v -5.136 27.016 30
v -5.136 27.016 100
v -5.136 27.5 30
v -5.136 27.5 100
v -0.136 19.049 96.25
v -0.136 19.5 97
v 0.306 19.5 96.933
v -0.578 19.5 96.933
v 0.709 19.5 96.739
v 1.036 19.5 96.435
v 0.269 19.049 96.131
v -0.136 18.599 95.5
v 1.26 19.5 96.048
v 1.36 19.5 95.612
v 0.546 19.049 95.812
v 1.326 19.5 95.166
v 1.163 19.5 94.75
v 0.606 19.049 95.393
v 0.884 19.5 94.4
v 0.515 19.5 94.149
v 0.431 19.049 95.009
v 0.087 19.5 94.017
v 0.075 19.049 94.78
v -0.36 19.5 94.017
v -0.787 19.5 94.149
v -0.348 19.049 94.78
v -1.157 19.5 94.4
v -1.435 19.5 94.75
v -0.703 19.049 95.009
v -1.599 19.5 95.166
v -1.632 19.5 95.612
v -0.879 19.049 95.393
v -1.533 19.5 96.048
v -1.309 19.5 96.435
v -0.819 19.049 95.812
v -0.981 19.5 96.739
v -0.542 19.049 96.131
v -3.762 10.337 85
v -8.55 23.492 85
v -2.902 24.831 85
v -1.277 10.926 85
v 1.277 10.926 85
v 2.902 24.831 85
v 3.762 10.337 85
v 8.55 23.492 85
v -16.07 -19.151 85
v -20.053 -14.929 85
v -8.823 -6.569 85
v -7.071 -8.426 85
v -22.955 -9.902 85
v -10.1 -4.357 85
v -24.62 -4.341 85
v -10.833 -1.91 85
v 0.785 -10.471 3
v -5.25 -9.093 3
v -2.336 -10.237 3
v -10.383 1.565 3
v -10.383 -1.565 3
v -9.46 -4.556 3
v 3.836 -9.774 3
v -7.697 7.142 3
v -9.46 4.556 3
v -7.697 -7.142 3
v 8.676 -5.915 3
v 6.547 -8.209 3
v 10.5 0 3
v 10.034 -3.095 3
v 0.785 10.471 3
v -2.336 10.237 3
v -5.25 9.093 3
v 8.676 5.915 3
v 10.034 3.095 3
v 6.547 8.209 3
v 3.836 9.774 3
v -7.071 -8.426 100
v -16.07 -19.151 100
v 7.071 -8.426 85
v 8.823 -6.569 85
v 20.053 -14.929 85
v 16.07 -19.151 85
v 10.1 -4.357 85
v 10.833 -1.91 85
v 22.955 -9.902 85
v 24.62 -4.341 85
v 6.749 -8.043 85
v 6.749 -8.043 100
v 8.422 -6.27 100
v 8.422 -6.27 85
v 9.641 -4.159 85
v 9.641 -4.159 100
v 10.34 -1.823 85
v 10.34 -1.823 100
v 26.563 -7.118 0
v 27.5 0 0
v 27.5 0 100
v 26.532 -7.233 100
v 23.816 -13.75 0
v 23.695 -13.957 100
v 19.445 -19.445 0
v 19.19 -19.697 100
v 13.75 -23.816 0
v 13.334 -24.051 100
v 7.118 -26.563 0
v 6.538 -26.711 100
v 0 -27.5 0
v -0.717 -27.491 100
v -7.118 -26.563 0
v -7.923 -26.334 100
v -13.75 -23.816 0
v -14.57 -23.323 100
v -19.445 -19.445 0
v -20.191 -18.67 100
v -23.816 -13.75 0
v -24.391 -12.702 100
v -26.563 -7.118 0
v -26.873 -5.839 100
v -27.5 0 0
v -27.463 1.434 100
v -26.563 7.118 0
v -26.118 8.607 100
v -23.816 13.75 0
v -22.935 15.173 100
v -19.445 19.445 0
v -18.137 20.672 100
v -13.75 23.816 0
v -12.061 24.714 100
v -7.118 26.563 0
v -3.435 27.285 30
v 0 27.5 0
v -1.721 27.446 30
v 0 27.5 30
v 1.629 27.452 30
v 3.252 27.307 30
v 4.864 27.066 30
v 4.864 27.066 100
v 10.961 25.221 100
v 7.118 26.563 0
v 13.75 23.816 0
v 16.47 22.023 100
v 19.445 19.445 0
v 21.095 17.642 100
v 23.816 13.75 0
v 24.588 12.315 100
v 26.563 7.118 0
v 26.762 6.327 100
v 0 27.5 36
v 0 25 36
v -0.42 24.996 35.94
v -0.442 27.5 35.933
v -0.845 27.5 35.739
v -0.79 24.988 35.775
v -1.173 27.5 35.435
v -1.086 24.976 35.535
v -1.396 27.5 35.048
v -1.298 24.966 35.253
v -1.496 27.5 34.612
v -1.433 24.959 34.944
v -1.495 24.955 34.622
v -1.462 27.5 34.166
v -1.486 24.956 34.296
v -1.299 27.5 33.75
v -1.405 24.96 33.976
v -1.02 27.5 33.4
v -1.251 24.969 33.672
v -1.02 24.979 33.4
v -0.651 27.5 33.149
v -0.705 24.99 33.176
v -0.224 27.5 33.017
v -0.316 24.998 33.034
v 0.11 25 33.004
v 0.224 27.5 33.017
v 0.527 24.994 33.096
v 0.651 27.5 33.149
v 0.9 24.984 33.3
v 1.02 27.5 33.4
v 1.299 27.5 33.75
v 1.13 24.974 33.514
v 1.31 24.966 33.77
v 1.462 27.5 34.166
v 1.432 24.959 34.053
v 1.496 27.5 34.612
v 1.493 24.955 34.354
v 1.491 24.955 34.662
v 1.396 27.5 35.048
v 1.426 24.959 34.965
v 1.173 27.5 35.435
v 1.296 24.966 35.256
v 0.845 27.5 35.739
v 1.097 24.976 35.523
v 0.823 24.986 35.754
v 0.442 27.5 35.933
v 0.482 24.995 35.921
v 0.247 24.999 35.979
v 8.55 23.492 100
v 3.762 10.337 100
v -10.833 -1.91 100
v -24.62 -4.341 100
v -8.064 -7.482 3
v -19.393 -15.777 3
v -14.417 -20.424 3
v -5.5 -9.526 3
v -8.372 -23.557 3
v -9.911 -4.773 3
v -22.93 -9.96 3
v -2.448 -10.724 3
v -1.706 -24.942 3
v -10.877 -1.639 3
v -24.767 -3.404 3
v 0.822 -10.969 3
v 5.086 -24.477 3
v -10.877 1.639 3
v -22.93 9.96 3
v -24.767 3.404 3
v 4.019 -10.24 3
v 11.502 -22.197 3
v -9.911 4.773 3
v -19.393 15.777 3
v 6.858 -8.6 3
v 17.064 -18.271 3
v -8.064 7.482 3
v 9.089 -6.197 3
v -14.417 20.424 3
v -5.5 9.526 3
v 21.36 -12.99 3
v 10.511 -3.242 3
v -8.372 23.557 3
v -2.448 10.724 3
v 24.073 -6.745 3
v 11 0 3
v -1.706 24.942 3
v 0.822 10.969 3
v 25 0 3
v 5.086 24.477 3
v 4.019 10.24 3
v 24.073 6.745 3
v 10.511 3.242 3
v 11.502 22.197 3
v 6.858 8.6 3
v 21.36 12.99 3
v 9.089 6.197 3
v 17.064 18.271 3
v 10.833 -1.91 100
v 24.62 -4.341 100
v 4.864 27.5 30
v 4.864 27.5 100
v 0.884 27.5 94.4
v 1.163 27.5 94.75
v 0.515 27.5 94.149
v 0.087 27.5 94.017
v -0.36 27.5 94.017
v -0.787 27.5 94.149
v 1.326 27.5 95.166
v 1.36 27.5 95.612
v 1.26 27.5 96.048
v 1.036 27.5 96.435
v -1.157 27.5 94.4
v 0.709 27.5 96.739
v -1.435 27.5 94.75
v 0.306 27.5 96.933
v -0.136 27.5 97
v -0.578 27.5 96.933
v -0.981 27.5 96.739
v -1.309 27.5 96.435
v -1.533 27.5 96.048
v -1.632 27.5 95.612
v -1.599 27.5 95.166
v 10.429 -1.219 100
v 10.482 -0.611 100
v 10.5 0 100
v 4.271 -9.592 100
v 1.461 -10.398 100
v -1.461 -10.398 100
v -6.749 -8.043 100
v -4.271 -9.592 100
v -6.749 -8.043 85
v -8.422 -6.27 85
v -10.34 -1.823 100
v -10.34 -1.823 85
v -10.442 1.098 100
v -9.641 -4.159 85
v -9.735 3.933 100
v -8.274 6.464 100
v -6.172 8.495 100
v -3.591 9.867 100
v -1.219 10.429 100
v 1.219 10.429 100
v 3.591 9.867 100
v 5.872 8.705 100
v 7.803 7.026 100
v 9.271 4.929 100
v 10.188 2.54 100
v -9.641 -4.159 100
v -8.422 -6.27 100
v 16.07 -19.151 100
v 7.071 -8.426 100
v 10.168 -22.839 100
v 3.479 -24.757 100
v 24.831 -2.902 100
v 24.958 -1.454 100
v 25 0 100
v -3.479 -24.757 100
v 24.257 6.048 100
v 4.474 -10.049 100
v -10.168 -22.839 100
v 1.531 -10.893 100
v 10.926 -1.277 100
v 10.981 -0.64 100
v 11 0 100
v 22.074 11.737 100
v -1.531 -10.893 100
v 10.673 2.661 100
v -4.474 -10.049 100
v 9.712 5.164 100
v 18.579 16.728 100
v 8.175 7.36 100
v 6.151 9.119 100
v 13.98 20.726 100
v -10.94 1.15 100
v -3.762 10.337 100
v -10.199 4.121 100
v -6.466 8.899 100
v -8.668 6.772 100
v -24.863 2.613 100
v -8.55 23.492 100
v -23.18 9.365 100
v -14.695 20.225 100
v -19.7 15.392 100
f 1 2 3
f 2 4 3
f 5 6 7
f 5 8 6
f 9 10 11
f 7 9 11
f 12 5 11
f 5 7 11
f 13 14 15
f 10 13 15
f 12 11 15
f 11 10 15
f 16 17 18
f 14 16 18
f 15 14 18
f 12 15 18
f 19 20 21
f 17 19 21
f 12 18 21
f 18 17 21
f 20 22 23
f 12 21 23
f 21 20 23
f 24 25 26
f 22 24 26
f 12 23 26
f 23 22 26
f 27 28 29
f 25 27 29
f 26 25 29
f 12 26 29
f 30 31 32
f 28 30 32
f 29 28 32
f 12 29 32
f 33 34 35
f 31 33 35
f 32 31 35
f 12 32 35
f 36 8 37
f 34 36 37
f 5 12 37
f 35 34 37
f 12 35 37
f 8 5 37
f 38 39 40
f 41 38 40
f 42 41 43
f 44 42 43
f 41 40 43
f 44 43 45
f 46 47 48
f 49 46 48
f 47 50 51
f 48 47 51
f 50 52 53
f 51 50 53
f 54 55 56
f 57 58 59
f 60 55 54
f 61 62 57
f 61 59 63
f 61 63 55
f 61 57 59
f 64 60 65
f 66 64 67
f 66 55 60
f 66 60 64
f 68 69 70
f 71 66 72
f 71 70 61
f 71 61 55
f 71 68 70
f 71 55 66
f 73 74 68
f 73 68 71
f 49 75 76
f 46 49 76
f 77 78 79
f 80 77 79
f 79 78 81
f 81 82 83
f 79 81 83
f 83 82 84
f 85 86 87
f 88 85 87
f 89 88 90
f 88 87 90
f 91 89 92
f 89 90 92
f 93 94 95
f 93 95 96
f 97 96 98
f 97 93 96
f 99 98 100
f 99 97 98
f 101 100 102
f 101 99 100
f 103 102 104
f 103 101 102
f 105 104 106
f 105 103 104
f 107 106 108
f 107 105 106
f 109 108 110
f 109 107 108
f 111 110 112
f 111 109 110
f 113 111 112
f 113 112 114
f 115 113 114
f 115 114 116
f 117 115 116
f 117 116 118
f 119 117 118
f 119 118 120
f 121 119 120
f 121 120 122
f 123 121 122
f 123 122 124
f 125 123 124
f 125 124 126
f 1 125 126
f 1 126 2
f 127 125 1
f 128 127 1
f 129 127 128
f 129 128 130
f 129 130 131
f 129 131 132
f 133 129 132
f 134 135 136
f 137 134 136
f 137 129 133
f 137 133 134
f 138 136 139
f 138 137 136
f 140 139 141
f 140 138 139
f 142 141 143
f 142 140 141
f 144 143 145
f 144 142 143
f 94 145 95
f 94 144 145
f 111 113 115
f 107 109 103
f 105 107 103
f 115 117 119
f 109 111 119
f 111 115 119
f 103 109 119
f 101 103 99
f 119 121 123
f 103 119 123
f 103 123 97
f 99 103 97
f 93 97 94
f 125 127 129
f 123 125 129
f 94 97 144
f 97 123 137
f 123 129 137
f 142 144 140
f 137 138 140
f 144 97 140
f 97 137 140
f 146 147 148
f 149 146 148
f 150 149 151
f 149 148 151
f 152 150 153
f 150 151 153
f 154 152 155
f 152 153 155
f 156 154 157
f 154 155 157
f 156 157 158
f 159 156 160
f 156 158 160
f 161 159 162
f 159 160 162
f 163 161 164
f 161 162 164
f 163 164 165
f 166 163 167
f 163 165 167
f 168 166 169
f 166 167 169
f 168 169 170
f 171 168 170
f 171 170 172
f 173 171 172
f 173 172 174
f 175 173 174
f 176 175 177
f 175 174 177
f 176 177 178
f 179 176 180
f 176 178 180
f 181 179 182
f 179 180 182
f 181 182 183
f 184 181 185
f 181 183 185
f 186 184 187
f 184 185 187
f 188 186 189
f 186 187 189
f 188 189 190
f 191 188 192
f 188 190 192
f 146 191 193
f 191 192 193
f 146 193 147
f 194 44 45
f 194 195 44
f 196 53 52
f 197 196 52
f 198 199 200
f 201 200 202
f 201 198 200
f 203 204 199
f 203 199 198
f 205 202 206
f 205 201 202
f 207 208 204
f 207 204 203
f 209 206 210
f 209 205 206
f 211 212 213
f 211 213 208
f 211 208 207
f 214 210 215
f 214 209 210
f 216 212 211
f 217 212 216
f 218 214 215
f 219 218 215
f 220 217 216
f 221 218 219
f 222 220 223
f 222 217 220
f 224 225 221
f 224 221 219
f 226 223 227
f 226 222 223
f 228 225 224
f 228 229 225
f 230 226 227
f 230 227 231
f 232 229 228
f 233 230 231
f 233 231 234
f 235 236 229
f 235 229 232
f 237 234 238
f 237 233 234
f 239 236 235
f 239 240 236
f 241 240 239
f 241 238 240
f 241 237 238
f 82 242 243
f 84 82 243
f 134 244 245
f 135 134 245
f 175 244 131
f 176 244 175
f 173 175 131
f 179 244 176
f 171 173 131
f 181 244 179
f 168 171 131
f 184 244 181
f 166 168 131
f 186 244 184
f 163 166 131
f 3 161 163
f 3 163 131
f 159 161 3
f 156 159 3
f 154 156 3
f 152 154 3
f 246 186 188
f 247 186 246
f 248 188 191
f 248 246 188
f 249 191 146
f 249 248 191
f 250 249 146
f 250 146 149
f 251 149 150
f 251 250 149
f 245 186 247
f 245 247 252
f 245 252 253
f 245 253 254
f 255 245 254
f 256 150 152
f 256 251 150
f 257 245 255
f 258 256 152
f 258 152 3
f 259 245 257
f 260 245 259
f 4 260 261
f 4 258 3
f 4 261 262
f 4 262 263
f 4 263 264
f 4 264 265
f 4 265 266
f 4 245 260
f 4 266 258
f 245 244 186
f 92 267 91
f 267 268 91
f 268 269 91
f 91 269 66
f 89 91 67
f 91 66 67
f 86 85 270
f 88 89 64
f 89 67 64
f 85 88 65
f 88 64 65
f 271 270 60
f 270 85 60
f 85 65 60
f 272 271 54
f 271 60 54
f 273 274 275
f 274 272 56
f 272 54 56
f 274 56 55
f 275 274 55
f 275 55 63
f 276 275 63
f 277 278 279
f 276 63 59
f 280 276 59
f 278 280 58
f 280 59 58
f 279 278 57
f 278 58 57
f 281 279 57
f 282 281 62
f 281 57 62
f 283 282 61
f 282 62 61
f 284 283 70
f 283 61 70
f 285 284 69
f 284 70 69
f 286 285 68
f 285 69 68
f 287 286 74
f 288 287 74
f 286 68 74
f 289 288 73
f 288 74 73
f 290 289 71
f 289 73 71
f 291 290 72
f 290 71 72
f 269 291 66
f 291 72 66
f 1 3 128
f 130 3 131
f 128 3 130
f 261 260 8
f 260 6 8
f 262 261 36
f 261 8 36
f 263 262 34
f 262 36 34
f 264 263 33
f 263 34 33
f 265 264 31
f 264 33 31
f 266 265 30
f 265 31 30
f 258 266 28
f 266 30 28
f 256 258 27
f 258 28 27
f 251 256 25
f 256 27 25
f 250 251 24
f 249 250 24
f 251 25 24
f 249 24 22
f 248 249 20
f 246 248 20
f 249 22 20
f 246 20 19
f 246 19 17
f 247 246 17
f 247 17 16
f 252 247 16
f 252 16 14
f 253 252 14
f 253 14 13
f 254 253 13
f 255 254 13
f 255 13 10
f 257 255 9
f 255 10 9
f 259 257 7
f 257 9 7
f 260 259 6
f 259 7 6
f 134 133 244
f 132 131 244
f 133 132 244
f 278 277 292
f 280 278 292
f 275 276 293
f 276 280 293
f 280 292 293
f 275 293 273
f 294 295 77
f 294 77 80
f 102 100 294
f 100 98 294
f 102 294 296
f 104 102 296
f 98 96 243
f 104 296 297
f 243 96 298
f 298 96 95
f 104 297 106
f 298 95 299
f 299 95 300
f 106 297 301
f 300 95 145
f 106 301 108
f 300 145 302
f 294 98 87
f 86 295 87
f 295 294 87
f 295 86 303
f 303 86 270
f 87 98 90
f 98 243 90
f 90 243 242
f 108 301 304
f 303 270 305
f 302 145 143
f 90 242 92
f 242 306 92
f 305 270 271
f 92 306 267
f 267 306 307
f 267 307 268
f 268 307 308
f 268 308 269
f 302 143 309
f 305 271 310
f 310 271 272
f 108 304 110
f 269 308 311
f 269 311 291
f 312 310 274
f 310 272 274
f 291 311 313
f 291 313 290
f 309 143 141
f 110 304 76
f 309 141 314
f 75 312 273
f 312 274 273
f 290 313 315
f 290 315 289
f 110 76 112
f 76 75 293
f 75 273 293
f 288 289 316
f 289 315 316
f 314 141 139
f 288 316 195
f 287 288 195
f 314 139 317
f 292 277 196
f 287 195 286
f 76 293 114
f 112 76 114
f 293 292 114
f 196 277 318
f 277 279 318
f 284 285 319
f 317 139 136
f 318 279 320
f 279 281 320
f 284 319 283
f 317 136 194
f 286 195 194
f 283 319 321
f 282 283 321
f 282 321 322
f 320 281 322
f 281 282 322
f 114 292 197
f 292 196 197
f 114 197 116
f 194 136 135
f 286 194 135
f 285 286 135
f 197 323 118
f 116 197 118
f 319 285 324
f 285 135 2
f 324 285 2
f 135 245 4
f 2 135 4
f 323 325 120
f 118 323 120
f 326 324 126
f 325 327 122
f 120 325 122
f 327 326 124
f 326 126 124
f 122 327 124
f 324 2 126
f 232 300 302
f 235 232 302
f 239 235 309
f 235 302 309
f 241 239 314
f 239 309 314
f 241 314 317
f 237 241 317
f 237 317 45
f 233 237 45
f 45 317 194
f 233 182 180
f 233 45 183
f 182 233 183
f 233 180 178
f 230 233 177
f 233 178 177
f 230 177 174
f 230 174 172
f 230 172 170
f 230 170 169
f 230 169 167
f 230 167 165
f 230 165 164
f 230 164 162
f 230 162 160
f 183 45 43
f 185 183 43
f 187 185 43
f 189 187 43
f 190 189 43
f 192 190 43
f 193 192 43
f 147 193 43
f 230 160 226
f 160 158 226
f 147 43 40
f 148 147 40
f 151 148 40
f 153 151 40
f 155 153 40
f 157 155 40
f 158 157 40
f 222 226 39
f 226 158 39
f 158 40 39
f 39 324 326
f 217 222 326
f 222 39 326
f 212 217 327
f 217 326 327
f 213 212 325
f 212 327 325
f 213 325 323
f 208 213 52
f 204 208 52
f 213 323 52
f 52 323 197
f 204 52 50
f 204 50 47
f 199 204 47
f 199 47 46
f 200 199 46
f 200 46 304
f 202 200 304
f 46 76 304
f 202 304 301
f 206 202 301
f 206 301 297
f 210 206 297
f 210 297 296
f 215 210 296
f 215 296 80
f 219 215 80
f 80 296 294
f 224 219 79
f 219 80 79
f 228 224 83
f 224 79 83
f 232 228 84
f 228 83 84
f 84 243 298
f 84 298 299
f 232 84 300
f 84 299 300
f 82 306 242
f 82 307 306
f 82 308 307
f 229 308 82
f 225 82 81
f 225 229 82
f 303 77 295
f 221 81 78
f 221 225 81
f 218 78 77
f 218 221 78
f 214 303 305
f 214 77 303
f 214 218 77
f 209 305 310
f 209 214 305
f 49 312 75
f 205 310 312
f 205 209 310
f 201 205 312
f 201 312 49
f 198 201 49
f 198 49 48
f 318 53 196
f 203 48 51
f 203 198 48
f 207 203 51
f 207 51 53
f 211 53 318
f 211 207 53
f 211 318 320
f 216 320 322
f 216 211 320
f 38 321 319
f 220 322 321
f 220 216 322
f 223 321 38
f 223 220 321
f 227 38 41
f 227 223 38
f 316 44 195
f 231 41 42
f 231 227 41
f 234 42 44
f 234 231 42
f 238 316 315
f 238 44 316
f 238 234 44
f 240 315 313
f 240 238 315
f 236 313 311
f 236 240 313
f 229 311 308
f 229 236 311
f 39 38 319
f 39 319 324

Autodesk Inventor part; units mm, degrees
ref_plane "YZ Plane" through (0, 0, 0) normal (1, 0, 0) x (0, 1, 0)
ref_plane "XZ Plane" through (0, 0, 0) normal (0, 1, 0) x (-1, 0, 0)
ref_plane "XY Plane" through (0, 0, 0) normal (0, 0, 1) x (1, 0, 0)
sketch "スケッチ1" plane through (0, 0, 0) normal (0, 0, 1) x (1, 0, 0)
  circle A0 centre (0, 0) radius 27.5
  dimension "d0" = 55
extrude "押し出し1" add sketch "スケッチ1" along normal blind 100
sketch "スケッチ2" plane through (0, 0, 100) normal (0, 0, 1) x (1, 0, 0)
  circle A0 centre (0, 0) radius 27.5 projected
  circle A1 centre (0, 0) radius 25
  dimension "d3" = 50
extrude "押し出し2" cut sketch "スケッチ2" against normal blind 97 contours A1
sketch "スケッチ3" plane through (0, 0, 3) normal (0, 0, 1) x (1, 0, 0)
  circle A0 centre (0, 0) radius 25 projected
  circle A1 centre (0, 0) radius 10.5
  circle A2 centre (0, 0) radius 11
  dimension "d6" = 21
  dimension "d7" = 22
extrude "押し出し3" add sketch "スケッチ3" along normal blind 97 contours A2
sketch "スケッチ4" plane through (0, 0, 100) normal (0, 0, 1) x (1, 0, 0)
  circle A0 centre (0, 0) radius 25 projected
  circle A1 centre (0, 0) radius 27.5 projected
  circle A2 centre (0, 0) radius 11
  line L0 (0, 0) -> (0, 25)
  line L1 (0, 0) -> (8.5505, 23.4923)
  line L2 (0, 0) -> (25, 0) construction
  line L3 (0, 0) -> (-8.5505, 23.4923)
  line L4 (0, 0) -> (25, 0) construction
  line L5 (0, 0) -> (-21.6506, -12.5)
  line L6 (0, 0) -> (25, 0) construction
  line L7 (0, 0) -> (21.6506, -12.5)
  line L8 (0, 0) -> (25, 0) construction
  line L9 (0, 0) -> (-16.0697, -19.1511)
  line L10 (0, 0) -> (25, 0) construction
  line L11 (0, 0) -> (-24.6202, -4.3412)
  line L12 (0, 0) -> (25, 0) construction
  line L13 (0, 0) -> (24.6202, -4.3412)
  line L14 (0, 0) -> (25, 0) construction
  line L15 (0, 0) -> (16.0697, -19.1511)
  line L16 (0, 0) -> (25, 0) construction
  dimension "d10" = 22
  dimension "d11" = 70
  dimension "d12" = 110
  dimension "d13" = 150
  dimension "d14" = 30
  dimension "d15" = 130
  dimension "d16" = 170
  dimension "d17" = 10
  dimension "d18" = 50
extrude "押し出し4" add sketch "スケッチ4" against normal blind 15 contours L1 A2 L0 A0 | A0 L7 A2 L13 | L0 A2 L3 A0 | L1 L0 A2 | A0 L15 A2 L7 | A2 L7 L13 | L0 L3 A2 | L9 A2 L5 | L5 A2 L11 | L7 A2 L15 | L11 A2 L5 A0 | A2 L9 A0 L5
sketch "スケッチ5" plane through (0, 0, 100) normal (0, 0, 1) x (1, 0, 0)
  arc A0 (-6.7493, -8.0435) -> (6.7493, -8.0435) centre (0, 0) ccw projected
  line L0 (-6.7493, -8.0435) -> (0, 0) projected
  line L1 (0, 0) -> (-10.3405, -1.8233) projected
  arc A1 (-3.5912, 9.8668) -> (-10.3405, -1.8233) centre (0, 0) ccw projected
  line L2 (-3.5912, 9.8668) -> (0, 0) projected
  line L3 (0, 0) -> (3.5912, 9.8668) projected
  arc A2 (10.3405, -1.8233) -> (3.5912, 9.8668) centre (0, 0) ccw projected
  line L4 (10.3405, -1.8233) -> (0, 0) projected
  line L5 (0, 0) -> (6.7493, -8.0435) projected
  circle A3 centre (0, 0) radius 27.5 projected
  circle A4 centre (0, 0) radius 10.5
extrude "押し出し5" cut sketch "スケッチ5" against normal blind 15 contours A4 L1 L0 | L5 L4 A4 | L2 A4 L3
sketch "スケッチ6" plane through (0, 0, 100) normal (0, 0, 1) x (1, 0, 0)
  circle A0 centre (0, 0) radius 27.5 projected
  line L0 (24.6202, -4.3412) -> (10.8329, -1.9101) projected
  arc A1 (10.8329, -1.9101) -> (3.7622, 10.3366) centre (0, 0) ccw projected
  line L1 (3.7622, 10.3366) -> (8.5505, 23.4923) projected
  arc A2 (24.6202, -4.3412) -> (8.5505, 23.4923) centre (0, 0) ccw projected
  arc A3 (-8.5505, 23.4923) -> (-24.6202, -4.3412) centre (0, 0) ccw projected
  line L2 (-8.5505, 23.4923) -> (-3.7622, 10.3366) projected
  arc A4 (-3.7622, 10.3366) -> (-10.8329, -1.9101) centre (0, 0) ccw projected
  line L3 (-10.8329, -1.9101) -> (-24.6202, -4.3412) projected
  arc A5 (-16.0697, -19.1511) -> (16.0697, -19.1511) centre (0, 0) ccw projected
  line L4 (-16.0697, -19.1511) -> (-7.0707, -8.4265) projected
  arc A6 (-7.0707, -8.4265) -> (7.0707, -8.4265) centre (0, 0) ccw projected
  line L5 (7.0707, -8.4265) -> (16.0697, -19.1511) projected
  circle A7 centre (0, 0) radius 10.5 projected
  point P0 (0, 27.5)
ref_plane "作業平面1" through (0, 27.5, 100) normal (0, 1, 0) x (-1, 0, 0)
sketch "スケッチ8" plane through (0, 27.5, 100) normal (0, 1, 0) x (-1, 0, 0)
  line L0 (-4.8637, 0) -> (5.1363, 0)
  line L1 (5.1363, 0) -> (5.1363, -70)
  line L2 (5.1363, -70) -> (-4.8637, -70)
  line L3 (-4.8637, -70) -> (-4.8637, 0)
  line L4 (27.5, 0) -> (-27.5, 0) projected
  line L5 (0, 0) -> (0, -6)
  line L6 (0.1363, -70) -> (0.1363, -64)
  point P0 (0, -100)
  dimension "d27" = 10
  dimension "d28" = 70
  dimension "d29" = 0
  dimension "d30" = 6
  dimension "d31" = 6
extrude "押し出し6" add sketch "スケッチ8" against normal blind 1
sketch "スケッチ9" plane through (0, 27.5, 100) normal (0, 1, 0) x (1, 0, 0)
  line L0 (4.8637, 0) -> (-5.1363, 0) projected
  line L1 (-5.1363, 0) -> (-5.1363, 70) projected
  line L2 (0, 70) -> (0, 65.5)
  line L3 (-0.1363, 0) -> (-0.1363, 4.5)
  point P0 (0, 100)
  dimension "d34" = 4.5
  dimension "d35" = 4.5
hole "穴1" at (0, 27.5, 34.5) at (-0.1363, 27.5, 95.5) direction (0, -1, 0) diameter 3 depth 8 tip angle 118
thread "ねじ1" size "M3x0.5" class "6H" standard "ANSI Metric M Profile" full length
thread "ねじ2" size "M3x0.5" class "6H" standard "ANSI Metric M Profile" full length
sketch "スケッチ10" plane through (0, 27.5, 100) normal (0, 1, 0) x (1, 0, 0)
  circle A0 centre (0, 65.5) radius 1.5 projected
  circle A1 centre (-0.1363, 4.5) radius 1.5 projected
  line L0 (4.8637, 0) -> (-5.1363, 0) projected
  line L1 (4.8637, 70) -> (4.8637, 0) projected
  line L2 (0, 70) -> (4.8637, 70) projected
  line L3 (-5.1363, 70) -> (0, 70) projected
  line L4 (-5.1363, 0) -> (-5.1363, 70) projected
  point P0 (0, 100)
properties part number "知能ロボコンシリンダ" material "ABS プラスチック"
